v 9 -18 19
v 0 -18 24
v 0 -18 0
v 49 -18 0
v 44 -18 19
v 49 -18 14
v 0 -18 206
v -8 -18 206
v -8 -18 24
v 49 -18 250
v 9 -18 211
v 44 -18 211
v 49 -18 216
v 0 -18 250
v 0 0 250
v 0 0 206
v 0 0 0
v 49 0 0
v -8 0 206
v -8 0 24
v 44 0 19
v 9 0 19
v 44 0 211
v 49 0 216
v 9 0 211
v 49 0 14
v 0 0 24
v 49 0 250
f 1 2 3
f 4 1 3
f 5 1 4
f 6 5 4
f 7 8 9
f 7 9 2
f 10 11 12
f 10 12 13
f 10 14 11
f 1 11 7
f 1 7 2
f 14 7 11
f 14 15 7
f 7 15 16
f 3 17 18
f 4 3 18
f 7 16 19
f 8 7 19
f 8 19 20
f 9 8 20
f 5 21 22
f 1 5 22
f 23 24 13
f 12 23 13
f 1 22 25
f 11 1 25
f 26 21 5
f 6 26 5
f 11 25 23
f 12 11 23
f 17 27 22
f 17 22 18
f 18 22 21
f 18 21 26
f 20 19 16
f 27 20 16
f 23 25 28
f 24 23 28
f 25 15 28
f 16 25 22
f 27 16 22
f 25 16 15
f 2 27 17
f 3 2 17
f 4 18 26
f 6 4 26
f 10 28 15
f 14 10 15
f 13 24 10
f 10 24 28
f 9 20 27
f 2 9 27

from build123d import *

# Parameters (mm, degrees)
F1_DEPTH = 18
F2_SIZE  = 5


with BuildPart() as f1:
    # F0 (on Front) → F1 (new body)
    with BuildSketch(Plane.XZ):
        Polygon((0, 24), (0, 0), (49, 0), (49, 19), (9, 19), (9, 211), (49, 211), (49, 250), (0, 250), (0, 206), (-8, 206), (-8, 24), align=None)
    extrude(amount=F1_DEPTH)

    # F2
    f2_edges = [f1.edges().sort_by_distance(p)[0] for p in [
        (49, -9, 211),
        (49, -9, 19),
    ]]
    chamfer(f2_edges, length=F2_SIZE)


solid = f1.part
